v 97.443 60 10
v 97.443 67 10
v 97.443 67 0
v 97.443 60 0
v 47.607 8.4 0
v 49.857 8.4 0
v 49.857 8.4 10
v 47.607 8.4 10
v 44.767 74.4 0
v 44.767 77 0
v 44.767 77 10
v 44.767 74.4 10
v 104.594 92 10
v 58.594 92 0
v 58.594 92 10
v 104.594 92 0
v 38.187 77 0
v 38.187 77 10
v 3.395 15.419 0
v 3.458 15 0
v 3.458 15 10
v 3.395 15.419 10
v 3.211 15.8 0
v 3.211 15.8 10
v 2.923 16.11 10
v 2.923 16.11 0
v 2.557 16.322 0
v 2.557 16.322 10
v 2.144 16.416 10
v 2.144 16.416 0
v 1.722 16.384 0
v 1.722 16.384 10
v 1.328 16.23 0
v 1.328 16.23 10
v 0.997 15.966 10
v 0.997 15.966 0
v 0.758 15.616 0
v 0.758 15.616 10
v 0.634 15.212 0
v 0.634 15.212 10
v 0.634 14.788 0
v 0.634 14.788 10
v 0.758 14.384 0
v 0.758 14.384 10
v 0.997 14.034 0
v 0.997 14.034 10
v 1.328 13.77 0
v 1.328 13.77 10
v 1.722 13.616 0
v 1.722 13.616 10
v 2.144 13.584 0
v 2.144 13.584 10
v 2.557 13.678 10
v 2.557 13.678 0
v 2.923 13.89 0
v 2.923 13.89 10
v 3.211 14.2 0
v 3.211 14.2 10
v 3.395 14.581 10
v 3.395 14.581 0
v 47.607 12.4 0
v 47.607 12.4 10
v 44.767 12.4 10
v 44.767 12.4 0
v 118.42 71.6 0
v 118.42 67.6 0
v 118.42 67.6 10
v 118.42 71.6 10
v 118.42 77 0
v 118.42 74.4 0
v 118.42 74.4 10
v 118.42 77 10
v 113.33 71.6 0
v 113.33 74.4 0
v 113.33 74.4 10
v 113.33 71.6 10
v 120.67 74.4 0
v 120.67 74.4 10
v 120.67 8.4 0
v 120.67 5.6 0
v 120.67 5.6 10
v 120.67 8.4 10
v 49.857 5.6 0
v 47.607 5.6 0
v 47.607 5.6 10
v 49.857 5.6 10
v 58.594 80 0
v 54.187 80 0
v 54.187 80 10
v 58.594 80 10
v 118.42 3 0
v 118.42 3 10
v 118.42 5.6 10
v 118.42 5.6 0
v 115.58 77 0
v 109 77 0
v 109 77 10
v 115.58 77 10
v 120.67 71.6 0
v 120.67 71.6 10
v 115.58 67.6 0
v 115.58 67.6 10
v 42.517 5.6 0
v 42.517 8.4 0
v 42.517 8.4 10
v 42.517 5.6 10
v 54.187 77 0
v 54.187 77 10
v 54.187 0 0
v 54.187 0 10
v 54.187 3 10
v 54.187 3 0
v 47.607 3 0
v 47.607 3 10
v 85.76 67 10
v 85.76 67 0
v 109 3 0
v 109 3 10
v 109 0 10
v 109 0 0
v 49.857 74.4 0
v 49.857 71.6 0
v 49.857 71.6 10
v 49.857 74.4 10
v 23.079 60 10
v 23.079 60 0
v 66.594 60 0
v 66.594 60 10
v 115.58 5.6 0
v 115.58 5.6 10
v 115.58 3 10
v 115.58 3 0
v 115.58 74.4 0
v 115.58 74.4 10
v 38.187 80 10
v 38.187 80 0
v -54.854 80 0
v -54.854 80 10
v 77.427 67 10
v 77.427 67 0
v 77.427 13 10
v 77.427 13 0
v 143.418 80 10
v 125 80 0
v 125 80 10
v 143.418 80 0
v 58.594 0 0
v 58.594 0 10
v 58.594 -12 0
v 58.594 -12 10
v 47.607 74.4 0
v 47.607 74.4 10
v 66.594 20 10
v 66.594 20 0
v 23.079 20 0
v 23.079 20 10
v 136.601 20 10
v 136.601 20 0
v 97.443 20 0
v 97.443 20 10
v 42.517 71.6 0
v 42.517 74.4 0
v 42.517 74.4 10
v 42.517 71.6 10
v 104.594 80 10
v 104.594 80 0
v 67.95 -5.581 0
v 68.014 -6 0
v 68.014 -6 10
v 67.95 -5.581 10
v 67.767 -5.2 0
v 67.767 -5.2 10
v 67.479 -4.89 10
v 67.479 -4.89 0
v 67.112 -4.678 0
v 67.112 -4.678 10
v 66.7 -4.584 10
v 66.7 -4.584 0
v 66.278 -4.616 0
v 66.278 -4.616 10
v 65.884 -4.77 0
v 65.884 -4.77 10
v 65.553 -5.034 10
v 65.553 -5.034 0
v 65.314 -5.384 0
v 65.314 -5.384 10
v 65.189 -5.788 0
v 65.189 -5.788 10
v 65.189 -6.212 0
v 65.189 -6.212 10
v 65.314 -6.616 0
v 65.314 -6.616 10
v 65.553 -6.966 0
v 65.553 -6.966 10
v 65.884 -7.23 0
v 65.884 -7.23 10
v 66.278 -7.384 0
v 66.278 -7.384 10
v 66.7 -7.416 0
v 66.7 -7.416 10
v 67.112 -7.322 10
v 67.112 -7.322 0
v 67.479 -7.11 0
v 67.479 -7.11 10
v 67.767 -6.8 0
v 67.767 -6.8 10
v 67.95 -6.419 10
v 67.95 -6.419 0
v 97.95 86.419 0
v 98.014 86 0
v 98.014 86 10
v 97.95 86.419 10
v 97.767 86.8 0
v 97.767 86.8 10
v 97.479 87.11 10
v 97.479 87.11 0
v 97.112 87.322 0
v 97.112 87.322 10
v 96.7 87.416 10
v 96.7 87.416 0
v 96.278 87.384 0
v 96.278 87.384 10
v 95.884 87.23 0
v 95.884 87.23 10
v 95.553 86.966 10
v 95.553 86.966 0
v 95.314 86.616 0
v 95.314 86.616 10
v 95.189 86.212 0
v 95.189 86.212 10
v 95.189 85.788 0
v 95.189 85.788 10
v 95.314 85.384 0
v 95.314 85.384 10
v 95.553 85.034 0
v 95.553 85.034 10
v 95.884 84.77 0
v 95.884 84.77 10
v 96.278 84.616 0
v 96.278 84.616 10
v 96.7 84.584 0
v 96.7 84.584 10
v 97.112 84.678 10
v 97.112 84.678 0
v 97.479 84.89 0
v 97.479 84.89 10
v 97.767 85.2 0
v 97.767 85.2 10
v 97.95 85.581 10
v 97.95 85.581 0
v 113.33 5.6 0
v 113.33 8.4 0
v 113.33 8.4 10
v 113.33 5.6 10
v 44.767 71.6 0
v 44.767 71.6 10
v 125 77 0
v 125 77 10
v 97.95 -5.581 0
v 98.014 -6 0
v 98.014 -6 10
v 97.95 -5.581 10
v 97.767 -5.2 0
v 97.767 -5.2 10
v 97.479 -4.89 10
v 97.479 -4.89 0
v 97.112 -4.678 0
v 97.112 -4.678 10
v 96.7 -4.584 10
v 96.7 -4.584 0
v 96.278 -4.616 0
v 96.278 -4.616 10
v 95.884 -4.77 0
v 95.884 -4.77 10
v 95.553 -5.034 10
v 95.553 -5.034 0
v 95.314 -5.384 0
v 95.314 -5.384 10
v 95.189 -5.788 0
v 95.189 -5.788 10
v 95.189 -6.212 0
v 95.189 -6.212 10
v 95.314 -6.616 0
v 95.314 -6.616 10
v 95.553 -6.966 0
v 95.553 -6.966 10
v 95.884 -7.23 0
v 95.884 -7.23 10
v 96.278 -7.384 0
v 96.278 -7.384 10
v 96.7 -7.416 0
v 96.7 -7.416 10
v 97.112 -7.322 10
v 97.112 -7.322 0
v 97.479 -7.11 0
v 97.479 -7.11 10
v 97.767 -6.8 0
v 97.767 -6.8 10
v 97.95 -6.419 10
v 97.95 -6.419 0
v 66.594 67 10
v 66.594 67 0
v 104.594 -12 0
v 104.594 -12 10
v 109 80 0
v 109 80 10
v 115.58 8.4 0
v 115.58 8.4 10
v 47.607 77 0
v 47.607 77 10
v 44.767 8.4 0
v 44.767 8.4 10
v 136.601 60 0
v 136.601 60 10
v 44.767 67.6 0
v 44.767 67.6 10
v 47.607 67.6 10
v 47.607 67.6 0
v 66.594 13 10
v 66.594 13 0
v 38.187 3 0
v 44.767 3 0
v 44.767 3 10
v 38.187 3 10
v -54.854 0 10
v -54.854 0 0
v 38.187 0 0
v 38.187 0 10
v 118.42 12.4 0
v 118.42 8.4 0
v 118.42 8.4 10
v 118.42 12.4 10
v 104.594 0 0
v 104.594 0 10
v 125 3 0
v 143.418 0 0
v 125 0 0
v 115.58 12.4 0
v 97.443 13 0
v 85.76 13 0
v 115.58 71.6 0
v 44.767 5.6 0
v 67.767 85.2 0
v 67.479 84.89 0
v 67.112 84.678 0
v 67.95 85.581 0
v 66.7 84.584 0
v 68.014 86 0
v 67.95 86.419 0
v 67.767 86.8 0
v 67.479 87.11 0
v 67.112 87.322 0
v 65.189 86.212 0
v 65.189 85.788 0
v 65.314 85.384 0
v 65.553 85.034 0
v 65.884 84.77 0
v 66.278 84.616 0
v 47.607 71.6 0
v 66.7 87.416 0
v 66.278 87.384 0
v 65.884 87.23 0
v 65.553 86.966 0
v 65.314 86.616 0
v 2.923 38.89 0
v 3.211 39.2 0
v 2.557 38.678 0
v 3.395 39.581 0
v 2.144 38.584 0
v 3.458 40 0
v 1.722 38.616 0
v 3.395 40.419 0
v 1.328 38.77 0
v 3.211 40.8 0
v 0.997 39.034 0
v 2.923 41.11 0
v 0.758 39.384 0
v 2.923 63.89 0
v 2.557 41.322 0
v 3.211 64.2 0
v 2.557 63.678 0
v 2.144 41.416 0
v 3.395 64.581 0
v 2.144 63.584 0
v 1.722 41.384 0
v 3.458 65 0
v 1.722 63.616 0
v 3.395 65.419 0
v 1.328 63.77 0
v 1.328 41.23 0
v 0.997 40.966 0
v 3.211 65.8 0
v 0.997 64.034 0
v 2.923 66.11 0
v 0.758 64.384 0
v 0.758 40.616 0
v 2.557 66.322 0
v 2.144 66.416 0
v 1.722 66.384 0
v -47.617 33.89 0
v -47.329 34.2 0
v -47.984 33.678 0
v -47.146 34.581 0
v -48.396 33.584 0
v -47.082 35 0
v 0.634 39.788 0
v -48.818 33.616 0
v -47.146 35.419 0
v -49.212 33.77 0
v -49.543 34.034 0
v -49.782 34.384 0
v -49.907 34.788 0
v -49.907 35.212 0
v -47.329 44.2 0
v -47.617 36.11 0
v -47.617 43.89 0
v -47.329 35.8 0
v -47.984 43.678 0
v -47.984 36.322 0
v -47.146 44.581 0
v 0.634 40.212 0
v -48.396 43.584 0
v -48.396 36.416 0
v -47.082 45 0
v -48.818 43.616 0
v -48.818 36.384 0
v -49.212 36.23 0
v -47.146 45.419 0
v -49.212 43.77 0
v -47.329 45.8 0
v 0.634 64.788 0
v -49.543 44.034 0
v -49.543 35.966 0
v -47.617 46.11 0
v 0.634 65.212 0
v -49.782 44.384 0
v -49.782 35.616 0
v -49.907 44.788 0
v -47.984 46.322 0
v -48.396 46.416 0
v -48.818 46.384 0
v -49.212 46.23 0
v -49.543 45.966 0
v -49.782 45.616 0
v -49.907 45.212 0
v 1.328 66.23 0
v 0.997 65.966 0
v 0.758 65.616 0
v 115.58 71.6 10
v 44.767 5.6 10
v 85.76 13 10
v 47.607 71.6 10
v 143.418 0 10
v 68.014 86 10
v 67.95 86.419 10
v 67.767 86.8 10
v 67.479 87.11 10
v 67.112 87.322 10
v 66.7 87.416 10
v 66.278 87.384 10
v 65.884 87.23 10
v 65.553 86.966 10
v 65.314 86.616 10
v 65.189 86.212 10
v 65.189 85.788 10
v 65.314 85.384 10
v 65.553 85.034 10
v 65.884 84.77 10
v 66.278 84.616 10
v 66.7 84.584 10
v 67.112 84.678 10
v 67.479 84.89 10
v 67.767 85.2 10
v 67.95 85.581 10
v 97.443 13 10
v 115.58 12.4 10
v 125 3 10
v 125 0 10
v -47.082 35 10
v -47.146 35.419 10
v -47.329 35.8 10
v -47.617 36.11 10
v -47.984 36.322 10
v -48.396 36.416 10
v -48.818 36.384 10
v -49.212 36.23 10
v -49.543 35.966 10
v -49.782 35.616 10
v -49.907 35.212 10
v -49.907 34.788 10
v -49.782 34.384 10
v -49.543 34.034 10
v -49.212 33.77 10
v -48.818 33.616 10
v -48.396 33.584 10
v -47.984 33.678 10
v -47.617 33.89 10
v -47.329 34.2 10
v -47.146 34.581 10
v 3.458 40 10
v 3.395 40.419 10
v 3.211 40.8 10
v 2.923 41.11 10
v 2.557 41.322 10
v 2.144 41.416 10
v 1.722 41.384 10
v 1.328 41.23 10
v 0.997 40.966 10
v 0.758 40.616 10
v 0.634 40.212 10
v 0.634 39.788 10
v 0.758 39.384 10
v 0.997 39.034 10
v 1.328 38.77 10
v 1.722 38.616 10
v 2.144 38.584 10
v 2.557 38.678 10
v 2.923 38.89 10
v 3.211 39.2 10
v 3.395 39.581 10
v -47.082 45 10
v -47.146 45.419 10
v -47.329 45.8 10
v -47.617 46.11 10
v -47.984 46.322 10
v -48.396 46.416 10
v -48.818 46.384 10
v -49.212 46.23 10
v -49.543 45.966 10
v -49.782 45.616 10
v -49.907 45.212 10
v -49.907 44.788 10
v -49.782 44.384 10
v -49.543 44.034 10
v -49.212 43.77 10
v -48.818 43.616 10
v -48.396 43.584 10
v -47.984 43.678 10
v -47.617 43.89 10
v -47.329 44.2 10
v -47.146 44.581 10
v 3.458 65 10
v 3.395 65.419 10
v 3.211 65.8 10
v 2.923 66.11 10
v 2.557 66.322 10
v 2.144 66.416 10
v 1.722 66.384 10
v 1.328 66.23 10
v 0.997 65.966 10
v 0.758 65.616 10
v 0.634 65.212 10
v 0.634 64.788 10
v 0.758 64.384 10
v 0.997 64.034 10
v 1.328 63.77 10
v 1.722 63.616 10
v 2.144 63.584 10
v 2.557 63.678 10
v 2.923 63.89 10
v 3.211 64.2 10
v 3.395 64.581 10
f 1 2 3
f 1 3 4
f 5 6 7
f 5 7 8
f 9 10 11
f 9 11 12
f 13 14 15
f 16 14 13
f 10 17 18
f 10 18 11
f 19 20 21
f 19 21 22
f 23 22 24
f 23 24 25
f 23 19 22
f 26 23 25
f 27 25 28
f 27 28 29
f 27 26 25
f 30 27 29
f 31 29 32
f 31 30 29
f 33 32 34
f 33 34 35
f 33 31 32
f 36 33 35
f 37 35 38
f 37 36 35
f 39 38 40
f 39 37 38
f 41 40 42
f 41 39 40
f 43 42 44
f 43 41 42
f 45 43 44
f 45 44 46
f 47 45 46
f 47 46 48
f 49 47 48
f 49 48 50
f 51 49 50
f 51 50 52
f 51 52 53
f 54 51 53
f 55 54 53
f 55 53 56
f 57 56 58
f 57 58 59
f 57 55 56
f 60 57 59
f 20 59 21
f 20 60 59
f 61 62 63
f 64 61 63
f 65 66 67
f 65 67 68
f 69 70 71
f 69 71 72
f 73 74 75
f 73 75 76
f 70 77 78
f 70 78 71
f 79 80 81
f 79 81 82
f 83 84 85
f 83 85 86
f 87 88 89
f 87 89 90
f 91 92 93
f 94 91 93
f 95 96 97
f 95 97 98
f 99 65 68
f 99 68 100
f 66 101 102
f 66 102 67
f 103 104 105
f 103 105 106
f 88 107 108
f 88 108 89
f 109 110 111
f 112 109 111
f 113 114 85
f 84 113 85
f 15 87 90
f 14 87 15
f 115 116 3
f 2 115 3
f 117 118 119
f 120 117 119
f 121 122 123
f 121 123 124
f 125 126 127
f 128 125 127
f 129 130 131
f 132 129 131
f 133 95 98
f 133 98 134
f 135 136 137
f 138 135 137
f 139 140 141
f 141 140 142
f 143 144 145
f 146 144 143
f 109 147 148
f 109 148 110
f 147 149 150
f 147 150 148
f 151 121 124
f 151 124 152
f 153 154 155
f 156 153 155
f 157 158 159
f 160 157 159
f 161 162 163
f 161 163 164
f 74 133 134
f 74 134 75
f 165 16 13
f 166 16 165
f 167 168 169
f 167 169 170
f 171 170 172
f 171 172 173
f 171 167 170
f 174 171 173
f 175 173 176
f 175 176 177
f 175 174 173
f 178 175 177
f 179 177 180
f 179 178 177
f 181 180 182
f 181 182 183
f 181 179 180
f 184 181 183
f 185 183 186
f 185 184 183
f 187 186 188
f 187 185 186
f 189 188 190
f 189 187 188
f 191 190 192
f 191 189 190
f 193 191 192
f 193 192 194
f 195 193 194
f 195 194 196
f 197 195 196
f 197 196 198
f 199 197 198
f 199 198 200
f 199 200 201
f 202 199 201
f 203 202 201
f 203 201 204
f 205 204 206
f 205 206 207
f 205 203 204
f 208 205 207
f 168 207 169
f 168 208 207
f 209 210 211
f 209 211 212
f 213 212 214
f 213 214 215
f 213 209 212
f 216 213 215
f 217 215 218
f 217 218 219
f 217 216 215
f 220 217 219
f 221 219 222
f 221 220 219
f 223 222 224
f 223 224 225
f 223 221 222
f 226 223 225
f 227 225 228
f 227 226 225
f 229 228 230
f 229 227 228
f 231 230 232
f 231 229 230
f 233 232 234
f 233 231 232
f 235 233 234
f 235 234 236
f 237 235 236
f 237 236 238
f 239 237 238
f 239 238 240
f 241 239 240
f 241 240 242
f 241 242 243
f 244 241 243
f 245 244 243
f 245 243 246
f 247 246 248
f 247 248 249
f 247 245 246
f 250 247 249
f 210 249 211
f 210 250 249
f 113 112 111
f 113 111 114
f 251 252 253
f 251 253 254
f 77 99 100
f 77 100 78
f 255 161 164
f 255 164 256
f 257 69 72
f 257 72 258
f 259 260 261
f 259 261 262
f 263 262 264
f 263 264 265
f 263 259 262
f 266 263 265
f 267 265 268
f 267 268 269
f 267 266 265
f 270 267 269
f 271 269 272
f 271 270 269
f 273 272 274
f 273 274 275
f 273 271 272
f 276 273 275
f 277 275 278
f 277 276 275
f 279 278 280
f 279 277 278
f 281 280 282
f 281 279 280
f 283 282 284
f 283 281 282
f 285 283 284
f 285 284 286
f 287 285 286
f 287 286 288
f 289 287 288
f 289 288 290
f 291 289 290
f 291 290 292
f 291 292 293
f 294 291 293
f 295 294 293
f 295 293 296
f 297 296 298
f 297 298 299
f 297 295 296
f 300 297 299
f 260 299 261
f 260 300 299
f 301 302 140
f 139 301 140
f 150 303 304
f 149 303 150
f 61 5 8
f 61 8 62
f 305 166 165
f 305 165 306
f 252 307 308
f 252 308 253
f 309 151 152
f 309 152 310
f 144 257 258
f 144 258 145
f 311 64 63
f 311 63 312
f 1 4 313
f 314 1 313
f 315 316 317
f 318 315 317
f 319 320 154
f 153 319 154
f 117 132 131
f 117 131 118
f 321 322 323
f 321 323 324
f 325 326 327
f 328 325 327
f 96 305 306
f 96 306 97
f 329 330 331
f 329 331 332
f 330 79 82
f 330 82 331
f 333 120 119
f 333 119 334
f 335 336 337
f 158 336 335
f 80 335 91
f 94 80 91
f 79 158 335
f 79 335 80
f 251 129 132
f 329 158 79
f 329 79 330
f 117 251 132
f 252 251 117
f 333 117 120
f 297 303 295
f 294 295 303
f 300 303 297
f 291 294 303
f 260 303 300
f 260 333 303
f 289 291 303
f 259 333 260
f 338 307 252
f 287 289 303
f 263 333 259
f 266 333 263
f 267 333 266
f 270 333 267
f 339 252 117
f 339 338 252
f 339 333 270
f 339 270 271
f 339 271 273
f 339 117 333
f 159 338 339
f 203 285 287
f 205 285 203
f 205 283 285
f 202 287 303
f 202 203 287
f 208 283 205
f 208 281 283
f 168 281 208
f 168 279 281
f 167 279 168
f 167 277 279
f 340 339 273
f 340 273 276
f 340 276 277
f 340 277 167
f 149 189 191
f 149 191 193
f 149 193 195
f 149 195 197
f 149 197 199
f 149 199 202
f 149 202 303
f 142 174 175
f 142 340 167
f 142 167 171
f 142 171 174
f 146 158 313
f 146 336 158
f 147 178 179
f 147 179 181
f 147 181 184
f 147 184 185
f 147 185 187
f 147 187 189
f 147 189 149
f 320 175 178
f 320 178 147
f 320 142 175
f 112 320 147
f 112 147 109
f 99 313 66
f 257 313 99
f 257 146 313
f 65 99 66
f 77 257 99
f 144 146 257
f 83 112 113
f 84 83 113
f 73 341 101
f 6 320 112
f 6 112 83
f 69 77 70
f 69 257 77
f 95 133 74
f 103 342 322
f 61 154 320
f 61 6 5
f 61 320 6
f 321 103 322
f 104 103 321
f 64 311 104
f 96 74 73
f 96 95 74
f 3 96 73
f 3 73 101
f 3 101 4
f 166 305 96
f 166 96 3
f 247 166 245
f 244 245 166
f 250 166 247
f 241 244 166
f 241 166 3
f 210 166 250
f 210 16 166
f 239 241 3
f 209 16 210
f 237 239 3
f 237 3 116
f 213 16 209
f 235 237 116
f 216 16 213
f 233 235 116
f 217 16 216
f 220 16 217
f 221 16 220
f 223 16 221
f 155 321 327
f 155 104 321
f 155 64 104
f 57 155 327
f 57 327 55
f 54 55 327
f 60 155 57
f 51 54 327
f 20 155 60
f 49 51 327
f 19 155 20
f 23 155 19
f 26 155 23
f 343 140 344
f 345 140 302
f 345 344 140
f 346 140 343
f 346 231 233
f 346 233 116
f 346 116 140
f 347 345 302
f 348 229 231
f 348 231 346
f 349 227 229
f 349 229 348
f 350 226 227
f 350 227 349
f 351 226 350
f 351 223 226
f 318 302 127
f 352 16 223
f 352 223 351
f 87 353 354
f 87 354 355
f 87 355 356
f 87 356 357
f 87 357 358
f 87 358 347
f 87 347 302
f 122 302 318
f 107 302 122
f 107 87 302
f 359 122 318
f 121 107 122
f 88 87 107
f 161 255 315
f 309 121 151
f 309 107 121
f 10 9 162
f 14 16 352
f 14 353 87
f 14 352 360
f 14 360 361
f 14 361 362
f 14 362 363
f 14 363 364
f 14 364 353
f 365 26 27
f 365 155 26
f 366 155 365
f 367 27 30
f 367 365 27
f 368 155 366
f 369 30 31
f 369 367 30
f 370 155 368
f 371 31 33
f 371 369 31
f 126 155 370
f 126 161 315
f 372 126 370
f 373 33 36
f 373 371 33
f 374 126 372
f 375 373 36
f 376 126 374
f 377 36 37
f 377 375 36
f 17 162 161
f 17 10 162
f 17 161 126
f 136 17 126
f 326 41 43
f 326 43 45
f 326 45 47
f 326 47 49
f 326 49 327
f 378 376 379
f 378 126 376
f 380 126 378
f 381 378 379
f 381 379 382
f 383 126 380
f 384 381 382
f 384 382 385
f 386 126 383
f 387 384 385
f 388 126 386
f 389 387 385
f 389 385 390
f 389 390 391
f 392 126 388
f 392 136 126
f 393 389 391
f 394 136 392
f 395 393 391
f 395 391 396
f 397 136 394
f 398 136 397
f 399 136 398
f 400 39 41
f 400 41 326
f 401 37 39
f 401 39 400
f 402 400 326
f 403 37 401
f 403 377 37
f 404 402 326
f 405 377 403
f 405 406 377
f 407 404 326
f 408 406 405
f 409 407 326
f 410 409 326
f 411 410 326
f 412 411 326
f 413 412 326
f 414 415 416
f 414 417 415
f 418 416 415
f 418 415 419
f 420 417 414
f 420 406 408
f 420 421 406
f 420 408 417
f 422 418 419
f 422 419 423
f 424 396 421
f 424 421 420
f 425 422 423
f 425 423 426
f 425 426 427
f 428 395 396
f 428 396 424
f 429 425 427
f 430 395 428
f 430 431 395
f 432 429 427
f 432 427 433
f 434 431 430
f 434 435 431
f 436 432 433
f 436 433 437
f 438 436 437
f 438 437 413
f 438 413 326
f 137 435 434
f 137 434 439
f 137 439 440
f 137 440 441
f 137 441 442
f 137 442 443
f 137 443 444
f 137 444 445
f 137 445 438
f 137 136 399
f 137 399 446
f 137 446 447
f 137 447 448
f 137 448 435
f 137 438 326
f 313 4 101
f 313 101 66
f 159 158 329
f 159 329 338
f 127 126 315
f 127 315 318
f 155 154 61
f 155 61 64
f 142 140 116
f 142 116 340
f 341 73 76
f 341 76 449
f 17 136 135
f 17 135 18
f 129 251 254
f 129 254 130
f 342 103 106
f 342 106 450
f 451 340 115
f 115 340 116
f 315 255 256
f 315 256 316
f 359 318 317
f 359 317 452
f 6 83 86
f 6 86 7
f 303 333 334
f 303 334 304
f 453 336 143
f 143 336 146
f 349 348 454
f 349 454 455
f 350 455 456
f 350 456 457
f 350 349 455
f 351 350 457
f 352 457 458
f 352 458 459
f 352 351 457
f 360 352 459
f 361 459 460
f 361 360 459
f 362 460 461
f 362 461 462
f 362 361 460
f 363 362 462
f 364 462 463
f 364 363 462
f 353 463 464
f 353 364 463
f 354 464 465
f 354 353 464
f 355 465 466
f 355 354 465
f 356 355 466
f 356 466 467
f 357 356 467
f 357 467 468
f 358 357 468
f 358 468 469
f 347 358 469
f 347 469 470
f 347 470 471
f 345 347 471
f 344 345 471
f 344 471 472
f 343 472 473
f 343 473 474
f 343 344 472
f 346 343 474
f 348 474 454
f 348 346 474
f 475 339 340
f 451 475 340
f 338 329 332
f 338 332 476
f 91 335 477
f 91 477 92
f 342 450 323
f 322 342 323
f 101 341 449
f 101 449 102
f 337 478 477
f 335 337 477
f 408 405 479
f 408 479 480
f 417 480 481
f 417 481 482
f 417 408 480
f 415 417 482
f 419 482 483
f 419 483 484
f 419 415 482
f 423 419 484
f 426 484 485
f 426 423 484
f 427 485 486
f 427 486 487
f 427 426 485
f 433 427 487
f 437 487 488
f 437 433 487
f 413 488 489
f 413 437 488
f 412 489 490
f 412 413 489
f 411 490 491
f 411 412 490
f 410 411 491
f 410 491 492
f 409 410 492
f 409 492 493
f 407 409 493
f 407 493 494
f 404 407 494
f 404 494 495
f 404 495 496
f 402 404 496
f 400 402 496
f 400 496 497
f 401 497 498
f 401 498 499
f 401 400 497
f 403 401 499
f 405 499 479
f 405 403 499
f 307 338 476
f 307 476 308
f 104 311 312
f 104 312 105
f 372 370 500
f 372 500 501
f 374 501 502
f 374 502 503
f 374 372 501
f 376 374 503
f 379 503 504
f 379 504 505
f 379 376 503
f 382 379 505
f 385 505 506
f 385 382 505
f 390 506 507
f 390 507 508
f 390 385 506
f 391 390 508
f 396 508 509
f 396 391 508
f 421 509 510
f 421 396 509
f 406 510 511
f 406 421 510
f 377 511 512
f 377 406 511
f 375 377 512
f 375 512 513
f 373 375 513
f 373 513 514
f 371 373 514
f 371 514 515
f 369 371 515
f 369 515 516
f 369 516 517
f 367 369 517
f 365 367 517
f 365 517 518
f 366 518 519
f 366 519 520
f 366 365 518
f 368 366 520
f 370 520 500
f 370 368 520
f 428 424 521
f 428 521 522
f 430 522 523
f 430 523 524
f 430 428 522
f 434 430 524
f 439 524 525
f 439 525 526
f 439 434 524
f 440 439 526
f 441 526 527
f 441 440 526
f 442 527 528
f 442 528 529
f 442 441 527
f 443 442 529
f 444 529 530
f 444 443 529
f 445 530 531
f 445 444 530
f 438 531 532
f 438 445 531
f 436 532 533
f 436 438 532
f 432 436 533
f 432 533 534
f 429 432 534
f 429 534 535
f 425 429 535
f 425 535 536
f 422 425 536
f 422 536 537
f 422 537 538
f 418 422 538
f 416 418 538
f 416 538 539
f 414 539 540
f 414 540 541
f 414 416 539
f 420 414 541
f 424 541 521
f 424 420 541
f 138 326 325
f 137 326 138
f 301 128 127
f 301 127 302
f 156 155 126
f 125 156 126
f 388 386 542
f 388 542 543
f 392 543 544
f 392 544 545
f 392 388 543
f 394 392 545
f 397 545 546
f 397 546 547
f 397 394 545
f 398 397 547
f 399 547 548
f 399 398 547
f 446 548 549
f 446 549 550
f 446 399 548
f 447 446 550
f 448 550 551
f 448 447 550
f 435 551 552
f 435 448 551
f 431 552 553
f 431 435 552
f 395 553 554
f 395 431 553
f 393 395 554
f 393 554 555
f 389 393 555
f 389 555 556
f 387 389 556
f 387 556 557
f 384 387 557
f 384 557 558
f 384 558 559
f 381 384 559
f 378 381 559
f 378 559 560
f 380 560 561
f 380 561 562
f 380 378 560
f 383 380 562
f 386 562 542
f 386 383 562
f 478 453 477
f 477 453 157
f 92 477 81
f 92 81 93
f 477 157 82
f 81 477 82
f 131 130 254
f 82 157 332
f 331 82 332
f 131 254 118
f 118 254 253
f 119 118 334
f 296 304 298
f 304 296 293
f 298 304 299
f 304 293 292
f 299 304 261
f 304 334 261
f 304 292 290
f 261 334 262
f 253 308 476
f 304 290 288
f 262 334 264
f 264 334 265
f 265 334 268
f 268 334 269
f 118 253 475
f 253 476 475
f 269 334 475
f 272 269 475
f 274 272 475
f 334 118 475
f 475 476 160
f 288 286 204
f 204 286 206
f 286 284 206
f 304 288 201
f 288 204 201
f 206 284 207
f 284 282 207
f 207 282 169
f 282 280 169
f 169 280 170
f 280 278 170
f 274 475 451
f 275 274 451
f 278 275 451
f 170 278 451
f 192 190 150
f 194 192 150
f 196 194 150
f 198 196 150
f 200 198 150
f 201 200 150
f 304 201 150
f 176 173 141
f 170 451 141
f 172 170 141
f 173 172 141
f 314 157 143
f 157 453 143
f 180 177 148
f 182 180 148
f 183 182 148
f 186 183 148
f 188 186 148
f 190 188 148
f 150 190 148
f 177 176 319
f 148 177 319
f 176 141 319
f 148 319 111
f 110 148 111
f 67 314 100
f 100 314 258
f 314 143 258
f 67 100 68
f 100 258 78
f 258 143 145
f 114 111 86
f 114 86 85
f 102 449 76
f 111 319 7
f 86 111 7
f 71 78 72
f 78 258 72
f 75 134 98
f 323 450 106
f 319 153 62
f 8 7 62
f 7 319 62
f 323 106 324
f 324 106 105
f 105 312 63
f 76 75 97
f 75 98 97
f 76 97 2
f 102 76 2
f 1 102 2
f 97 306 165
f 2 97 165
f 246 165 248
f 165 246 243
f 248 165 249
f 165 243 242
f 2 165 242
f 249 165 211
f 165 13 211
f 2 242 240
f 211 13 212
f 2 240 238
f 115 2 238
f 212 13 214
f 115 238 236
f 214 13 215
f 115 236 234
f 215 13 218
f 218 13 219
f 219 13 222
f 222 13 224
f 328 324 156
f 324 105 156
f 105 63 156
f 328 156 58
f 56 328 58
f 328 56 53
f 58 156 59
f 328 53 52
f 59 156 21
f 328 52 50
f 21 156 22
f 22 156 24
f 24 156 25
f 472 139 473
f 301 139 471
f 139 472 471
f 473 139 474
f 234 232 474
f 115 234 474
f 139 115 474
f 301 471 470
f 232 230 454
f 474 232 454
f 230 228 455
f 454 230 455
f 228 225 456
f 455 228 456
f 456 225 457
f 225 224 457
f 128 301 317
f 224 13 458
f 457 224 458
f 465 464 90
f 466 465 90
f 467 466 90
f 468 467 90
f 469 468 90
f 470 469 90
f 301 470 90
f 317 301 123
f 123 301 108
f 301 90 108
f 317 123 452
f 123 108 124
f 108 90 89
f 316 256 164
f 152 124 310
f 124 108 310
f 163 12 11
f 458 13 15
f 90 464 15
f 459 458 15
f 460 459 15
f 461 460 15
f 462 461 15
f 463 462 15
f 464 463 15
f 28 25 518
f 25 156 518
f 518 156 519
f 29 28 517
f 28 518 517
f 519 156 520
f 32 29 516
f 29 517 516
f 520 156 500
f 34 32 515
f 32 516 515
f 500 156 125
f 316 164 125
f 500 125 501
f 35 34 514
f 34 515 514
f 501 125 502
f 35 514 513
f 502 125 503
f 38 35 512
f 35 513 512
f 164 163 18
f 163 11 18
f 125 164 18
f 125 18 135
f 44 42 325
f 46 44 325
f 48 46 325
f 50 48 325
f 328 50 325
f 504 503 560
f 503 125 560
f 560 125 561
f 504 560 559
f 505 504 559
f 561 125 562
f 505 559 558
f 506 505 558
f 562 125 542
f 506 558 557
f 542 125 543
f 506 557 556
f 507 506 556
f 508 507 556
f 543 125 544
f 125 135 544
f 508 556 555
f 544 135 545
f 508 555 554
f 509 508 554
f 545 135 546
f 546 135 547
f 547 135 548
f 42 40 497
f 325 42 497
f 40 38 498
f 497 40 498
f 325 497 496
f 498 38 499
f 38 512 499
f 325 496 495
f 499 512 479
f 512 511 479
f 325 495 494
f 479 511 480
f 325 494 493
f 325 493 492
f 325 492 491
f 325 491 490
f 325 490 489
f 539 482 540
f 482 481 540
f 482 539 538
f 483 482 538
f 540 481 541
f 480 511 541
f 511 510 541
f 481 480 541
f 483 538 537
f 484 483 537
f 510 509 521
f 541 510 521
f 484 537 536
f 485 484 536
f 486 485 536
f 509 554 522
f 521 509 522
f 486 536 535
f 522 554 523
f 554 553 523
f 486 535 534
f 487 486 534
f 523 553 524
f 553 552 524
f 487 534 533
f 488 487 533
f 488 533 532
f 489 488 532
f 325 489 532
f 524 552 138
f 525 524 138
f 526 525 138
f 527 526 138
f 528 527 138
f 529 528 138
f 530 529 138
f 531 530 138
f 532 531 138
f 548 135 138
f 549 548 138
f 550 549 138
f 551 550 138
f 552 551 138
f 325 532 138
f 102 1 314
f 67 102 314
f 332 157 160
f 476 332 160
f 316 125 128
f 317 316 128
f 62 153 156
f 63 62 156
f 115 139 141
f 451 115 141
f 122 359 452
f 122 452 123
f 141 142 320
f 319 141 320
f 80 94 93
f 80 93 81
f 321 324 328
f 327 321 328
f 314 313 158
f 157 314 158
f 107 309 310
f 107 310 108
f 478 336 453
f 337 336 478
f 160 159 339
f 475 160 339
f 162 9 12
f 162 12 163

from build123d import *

# Parameters (mm, degrees)
SKETCH1_R           = 1.42
BOSS_EXTRUDE1_DEPTH = 10


with BuildPart() as part:
    # Sketch1 → Boss-Extrude1 (new body)
    with BuildSketch(Plane.XY):
        Polygon((109, 80), (109, 77), (115.58, 77), (115.58, 74.4), (113.33, 74.4), (113.33, 71.6), (115.58, 71.6), (115.58, 67.6), (118.42, 67.6), (118.42, 71.6), (120.67, 71.6), (120.67, 74.4), (118.42, 74.4), (118.42, 77), (125, 77), (125, 80), (143.417515172, 80), (143.417515172, 60), (143.417515172, 20), (143.417515172, 0), (125, 0), (125, 3), (118.42, 3), (118.42, 5.6), (120.67, 5.6), (120.67, 8.4), (118.42, 8.4), (118.42, 12.4), (115.58, 12.4), (115.58, 8.4), (113.33, 8.4), (113.33, 5.6), (115.58, 5.6), (115.58, 3), (109, 3), (109, 0), (104.593570259, 0), (104.593570259, -12), (58.593570259, -12), (58.593570259, 0), (54.187140517, 0), (54.187140517, 3), (47.607140517, 3), (47.607140517, 5.6), (49.857140517, 5.6), (49.857140517, 8.4), (47.607140517, 8.4), (47.607140517, 12.4), (44.767140517, 12.4), (44.767140517, 8.4), (42.517140517, 8.4), (42.517140517, 5.6), (44.767140517, 5.6), (44.767140517, 3), (38.187140517, 3), (38.187140517, 0), (0, 0), (-15.602079829, 0), (-54.853791786, 0), (-54.853791786, 80), (-15.602079829, 80), (5, 80), (38.187140517, 80), (38.187140517, 77), (44.767140517, 77), (44.767140517, 74.4), (42.517140517, 74.4), (42.517140517, 71.6), (44.767140517, 71.6), (44.767140517, 67.6), (47.607140517, 67.6), (47.607140517, 71.6), (49.857140517, 71.6), (49.857140517, 74.4), (47.607140517, 74.4), (47.607140517, 77), (54.187140517, 77), (54.187140517, 80), (58.593570259, 80), (58.593570259, 92), (104.593570259, 92), (104.593570259, 80), align=None)
        with Locations((2.037759908, 40)):
            Circle(SKETCH1_R, mode=Mode.SUBTRACT)
        with Locations((2.037759908, 65)):
            Circle(SKETCH1_R, mode=Mode.SUBTRACT)
        with Locations((2.037759908, 15)):
            Circle(SKETCH1_R, mode=Mode.SUBTRACT)
        with Locations((66.593570259, 86)):
            Circle(SKETCH1_R, mode=Mode.SUBTRACT)
        with Locations((96.593570259, 86)):
            Circle(SKETCH1_R, mode=Mode.SUBTRACT)
        with Locations((96.593570259, -6)):
            Circle(SKETCH1_R, mode=Mode.SUBTRACT)
        with Locations((66.593570259, -6)):
            Circle(SKETCH1_R, mode=Mode.SUBTRACT)
        with Locations((-48.502415741, 45)):
            Circle(SKETCH1_R, mode=Mode.SUBTRACT)
        with Locations((-48.502415741, 35)):
            Circle(SKETCH1_R, mode=Mode.SUBTRACT)
        Polygon((136.600558962, 60), (136.600558962, 20), (97.442765105, 20), (97.442765105, 13), (85.759642836, 13), (85.759642836, 67), (97.442765105, 67), (97.442765105, 60), align=None, mode=Mode.SUBTRACT)
        Polygon((23.079003763, 60), (66.593570259, 60), (66.593570259, 67), (77.427497681, 67), (77.427497681, 13), (66.593570259, 13), (66.593570259, 20), (23.079003763, 20), align=None, mode=Mode.SUBTRACT)
    extrude(amount=BOSS_EXTRUDE1_DEPTH)


solid = part.part
